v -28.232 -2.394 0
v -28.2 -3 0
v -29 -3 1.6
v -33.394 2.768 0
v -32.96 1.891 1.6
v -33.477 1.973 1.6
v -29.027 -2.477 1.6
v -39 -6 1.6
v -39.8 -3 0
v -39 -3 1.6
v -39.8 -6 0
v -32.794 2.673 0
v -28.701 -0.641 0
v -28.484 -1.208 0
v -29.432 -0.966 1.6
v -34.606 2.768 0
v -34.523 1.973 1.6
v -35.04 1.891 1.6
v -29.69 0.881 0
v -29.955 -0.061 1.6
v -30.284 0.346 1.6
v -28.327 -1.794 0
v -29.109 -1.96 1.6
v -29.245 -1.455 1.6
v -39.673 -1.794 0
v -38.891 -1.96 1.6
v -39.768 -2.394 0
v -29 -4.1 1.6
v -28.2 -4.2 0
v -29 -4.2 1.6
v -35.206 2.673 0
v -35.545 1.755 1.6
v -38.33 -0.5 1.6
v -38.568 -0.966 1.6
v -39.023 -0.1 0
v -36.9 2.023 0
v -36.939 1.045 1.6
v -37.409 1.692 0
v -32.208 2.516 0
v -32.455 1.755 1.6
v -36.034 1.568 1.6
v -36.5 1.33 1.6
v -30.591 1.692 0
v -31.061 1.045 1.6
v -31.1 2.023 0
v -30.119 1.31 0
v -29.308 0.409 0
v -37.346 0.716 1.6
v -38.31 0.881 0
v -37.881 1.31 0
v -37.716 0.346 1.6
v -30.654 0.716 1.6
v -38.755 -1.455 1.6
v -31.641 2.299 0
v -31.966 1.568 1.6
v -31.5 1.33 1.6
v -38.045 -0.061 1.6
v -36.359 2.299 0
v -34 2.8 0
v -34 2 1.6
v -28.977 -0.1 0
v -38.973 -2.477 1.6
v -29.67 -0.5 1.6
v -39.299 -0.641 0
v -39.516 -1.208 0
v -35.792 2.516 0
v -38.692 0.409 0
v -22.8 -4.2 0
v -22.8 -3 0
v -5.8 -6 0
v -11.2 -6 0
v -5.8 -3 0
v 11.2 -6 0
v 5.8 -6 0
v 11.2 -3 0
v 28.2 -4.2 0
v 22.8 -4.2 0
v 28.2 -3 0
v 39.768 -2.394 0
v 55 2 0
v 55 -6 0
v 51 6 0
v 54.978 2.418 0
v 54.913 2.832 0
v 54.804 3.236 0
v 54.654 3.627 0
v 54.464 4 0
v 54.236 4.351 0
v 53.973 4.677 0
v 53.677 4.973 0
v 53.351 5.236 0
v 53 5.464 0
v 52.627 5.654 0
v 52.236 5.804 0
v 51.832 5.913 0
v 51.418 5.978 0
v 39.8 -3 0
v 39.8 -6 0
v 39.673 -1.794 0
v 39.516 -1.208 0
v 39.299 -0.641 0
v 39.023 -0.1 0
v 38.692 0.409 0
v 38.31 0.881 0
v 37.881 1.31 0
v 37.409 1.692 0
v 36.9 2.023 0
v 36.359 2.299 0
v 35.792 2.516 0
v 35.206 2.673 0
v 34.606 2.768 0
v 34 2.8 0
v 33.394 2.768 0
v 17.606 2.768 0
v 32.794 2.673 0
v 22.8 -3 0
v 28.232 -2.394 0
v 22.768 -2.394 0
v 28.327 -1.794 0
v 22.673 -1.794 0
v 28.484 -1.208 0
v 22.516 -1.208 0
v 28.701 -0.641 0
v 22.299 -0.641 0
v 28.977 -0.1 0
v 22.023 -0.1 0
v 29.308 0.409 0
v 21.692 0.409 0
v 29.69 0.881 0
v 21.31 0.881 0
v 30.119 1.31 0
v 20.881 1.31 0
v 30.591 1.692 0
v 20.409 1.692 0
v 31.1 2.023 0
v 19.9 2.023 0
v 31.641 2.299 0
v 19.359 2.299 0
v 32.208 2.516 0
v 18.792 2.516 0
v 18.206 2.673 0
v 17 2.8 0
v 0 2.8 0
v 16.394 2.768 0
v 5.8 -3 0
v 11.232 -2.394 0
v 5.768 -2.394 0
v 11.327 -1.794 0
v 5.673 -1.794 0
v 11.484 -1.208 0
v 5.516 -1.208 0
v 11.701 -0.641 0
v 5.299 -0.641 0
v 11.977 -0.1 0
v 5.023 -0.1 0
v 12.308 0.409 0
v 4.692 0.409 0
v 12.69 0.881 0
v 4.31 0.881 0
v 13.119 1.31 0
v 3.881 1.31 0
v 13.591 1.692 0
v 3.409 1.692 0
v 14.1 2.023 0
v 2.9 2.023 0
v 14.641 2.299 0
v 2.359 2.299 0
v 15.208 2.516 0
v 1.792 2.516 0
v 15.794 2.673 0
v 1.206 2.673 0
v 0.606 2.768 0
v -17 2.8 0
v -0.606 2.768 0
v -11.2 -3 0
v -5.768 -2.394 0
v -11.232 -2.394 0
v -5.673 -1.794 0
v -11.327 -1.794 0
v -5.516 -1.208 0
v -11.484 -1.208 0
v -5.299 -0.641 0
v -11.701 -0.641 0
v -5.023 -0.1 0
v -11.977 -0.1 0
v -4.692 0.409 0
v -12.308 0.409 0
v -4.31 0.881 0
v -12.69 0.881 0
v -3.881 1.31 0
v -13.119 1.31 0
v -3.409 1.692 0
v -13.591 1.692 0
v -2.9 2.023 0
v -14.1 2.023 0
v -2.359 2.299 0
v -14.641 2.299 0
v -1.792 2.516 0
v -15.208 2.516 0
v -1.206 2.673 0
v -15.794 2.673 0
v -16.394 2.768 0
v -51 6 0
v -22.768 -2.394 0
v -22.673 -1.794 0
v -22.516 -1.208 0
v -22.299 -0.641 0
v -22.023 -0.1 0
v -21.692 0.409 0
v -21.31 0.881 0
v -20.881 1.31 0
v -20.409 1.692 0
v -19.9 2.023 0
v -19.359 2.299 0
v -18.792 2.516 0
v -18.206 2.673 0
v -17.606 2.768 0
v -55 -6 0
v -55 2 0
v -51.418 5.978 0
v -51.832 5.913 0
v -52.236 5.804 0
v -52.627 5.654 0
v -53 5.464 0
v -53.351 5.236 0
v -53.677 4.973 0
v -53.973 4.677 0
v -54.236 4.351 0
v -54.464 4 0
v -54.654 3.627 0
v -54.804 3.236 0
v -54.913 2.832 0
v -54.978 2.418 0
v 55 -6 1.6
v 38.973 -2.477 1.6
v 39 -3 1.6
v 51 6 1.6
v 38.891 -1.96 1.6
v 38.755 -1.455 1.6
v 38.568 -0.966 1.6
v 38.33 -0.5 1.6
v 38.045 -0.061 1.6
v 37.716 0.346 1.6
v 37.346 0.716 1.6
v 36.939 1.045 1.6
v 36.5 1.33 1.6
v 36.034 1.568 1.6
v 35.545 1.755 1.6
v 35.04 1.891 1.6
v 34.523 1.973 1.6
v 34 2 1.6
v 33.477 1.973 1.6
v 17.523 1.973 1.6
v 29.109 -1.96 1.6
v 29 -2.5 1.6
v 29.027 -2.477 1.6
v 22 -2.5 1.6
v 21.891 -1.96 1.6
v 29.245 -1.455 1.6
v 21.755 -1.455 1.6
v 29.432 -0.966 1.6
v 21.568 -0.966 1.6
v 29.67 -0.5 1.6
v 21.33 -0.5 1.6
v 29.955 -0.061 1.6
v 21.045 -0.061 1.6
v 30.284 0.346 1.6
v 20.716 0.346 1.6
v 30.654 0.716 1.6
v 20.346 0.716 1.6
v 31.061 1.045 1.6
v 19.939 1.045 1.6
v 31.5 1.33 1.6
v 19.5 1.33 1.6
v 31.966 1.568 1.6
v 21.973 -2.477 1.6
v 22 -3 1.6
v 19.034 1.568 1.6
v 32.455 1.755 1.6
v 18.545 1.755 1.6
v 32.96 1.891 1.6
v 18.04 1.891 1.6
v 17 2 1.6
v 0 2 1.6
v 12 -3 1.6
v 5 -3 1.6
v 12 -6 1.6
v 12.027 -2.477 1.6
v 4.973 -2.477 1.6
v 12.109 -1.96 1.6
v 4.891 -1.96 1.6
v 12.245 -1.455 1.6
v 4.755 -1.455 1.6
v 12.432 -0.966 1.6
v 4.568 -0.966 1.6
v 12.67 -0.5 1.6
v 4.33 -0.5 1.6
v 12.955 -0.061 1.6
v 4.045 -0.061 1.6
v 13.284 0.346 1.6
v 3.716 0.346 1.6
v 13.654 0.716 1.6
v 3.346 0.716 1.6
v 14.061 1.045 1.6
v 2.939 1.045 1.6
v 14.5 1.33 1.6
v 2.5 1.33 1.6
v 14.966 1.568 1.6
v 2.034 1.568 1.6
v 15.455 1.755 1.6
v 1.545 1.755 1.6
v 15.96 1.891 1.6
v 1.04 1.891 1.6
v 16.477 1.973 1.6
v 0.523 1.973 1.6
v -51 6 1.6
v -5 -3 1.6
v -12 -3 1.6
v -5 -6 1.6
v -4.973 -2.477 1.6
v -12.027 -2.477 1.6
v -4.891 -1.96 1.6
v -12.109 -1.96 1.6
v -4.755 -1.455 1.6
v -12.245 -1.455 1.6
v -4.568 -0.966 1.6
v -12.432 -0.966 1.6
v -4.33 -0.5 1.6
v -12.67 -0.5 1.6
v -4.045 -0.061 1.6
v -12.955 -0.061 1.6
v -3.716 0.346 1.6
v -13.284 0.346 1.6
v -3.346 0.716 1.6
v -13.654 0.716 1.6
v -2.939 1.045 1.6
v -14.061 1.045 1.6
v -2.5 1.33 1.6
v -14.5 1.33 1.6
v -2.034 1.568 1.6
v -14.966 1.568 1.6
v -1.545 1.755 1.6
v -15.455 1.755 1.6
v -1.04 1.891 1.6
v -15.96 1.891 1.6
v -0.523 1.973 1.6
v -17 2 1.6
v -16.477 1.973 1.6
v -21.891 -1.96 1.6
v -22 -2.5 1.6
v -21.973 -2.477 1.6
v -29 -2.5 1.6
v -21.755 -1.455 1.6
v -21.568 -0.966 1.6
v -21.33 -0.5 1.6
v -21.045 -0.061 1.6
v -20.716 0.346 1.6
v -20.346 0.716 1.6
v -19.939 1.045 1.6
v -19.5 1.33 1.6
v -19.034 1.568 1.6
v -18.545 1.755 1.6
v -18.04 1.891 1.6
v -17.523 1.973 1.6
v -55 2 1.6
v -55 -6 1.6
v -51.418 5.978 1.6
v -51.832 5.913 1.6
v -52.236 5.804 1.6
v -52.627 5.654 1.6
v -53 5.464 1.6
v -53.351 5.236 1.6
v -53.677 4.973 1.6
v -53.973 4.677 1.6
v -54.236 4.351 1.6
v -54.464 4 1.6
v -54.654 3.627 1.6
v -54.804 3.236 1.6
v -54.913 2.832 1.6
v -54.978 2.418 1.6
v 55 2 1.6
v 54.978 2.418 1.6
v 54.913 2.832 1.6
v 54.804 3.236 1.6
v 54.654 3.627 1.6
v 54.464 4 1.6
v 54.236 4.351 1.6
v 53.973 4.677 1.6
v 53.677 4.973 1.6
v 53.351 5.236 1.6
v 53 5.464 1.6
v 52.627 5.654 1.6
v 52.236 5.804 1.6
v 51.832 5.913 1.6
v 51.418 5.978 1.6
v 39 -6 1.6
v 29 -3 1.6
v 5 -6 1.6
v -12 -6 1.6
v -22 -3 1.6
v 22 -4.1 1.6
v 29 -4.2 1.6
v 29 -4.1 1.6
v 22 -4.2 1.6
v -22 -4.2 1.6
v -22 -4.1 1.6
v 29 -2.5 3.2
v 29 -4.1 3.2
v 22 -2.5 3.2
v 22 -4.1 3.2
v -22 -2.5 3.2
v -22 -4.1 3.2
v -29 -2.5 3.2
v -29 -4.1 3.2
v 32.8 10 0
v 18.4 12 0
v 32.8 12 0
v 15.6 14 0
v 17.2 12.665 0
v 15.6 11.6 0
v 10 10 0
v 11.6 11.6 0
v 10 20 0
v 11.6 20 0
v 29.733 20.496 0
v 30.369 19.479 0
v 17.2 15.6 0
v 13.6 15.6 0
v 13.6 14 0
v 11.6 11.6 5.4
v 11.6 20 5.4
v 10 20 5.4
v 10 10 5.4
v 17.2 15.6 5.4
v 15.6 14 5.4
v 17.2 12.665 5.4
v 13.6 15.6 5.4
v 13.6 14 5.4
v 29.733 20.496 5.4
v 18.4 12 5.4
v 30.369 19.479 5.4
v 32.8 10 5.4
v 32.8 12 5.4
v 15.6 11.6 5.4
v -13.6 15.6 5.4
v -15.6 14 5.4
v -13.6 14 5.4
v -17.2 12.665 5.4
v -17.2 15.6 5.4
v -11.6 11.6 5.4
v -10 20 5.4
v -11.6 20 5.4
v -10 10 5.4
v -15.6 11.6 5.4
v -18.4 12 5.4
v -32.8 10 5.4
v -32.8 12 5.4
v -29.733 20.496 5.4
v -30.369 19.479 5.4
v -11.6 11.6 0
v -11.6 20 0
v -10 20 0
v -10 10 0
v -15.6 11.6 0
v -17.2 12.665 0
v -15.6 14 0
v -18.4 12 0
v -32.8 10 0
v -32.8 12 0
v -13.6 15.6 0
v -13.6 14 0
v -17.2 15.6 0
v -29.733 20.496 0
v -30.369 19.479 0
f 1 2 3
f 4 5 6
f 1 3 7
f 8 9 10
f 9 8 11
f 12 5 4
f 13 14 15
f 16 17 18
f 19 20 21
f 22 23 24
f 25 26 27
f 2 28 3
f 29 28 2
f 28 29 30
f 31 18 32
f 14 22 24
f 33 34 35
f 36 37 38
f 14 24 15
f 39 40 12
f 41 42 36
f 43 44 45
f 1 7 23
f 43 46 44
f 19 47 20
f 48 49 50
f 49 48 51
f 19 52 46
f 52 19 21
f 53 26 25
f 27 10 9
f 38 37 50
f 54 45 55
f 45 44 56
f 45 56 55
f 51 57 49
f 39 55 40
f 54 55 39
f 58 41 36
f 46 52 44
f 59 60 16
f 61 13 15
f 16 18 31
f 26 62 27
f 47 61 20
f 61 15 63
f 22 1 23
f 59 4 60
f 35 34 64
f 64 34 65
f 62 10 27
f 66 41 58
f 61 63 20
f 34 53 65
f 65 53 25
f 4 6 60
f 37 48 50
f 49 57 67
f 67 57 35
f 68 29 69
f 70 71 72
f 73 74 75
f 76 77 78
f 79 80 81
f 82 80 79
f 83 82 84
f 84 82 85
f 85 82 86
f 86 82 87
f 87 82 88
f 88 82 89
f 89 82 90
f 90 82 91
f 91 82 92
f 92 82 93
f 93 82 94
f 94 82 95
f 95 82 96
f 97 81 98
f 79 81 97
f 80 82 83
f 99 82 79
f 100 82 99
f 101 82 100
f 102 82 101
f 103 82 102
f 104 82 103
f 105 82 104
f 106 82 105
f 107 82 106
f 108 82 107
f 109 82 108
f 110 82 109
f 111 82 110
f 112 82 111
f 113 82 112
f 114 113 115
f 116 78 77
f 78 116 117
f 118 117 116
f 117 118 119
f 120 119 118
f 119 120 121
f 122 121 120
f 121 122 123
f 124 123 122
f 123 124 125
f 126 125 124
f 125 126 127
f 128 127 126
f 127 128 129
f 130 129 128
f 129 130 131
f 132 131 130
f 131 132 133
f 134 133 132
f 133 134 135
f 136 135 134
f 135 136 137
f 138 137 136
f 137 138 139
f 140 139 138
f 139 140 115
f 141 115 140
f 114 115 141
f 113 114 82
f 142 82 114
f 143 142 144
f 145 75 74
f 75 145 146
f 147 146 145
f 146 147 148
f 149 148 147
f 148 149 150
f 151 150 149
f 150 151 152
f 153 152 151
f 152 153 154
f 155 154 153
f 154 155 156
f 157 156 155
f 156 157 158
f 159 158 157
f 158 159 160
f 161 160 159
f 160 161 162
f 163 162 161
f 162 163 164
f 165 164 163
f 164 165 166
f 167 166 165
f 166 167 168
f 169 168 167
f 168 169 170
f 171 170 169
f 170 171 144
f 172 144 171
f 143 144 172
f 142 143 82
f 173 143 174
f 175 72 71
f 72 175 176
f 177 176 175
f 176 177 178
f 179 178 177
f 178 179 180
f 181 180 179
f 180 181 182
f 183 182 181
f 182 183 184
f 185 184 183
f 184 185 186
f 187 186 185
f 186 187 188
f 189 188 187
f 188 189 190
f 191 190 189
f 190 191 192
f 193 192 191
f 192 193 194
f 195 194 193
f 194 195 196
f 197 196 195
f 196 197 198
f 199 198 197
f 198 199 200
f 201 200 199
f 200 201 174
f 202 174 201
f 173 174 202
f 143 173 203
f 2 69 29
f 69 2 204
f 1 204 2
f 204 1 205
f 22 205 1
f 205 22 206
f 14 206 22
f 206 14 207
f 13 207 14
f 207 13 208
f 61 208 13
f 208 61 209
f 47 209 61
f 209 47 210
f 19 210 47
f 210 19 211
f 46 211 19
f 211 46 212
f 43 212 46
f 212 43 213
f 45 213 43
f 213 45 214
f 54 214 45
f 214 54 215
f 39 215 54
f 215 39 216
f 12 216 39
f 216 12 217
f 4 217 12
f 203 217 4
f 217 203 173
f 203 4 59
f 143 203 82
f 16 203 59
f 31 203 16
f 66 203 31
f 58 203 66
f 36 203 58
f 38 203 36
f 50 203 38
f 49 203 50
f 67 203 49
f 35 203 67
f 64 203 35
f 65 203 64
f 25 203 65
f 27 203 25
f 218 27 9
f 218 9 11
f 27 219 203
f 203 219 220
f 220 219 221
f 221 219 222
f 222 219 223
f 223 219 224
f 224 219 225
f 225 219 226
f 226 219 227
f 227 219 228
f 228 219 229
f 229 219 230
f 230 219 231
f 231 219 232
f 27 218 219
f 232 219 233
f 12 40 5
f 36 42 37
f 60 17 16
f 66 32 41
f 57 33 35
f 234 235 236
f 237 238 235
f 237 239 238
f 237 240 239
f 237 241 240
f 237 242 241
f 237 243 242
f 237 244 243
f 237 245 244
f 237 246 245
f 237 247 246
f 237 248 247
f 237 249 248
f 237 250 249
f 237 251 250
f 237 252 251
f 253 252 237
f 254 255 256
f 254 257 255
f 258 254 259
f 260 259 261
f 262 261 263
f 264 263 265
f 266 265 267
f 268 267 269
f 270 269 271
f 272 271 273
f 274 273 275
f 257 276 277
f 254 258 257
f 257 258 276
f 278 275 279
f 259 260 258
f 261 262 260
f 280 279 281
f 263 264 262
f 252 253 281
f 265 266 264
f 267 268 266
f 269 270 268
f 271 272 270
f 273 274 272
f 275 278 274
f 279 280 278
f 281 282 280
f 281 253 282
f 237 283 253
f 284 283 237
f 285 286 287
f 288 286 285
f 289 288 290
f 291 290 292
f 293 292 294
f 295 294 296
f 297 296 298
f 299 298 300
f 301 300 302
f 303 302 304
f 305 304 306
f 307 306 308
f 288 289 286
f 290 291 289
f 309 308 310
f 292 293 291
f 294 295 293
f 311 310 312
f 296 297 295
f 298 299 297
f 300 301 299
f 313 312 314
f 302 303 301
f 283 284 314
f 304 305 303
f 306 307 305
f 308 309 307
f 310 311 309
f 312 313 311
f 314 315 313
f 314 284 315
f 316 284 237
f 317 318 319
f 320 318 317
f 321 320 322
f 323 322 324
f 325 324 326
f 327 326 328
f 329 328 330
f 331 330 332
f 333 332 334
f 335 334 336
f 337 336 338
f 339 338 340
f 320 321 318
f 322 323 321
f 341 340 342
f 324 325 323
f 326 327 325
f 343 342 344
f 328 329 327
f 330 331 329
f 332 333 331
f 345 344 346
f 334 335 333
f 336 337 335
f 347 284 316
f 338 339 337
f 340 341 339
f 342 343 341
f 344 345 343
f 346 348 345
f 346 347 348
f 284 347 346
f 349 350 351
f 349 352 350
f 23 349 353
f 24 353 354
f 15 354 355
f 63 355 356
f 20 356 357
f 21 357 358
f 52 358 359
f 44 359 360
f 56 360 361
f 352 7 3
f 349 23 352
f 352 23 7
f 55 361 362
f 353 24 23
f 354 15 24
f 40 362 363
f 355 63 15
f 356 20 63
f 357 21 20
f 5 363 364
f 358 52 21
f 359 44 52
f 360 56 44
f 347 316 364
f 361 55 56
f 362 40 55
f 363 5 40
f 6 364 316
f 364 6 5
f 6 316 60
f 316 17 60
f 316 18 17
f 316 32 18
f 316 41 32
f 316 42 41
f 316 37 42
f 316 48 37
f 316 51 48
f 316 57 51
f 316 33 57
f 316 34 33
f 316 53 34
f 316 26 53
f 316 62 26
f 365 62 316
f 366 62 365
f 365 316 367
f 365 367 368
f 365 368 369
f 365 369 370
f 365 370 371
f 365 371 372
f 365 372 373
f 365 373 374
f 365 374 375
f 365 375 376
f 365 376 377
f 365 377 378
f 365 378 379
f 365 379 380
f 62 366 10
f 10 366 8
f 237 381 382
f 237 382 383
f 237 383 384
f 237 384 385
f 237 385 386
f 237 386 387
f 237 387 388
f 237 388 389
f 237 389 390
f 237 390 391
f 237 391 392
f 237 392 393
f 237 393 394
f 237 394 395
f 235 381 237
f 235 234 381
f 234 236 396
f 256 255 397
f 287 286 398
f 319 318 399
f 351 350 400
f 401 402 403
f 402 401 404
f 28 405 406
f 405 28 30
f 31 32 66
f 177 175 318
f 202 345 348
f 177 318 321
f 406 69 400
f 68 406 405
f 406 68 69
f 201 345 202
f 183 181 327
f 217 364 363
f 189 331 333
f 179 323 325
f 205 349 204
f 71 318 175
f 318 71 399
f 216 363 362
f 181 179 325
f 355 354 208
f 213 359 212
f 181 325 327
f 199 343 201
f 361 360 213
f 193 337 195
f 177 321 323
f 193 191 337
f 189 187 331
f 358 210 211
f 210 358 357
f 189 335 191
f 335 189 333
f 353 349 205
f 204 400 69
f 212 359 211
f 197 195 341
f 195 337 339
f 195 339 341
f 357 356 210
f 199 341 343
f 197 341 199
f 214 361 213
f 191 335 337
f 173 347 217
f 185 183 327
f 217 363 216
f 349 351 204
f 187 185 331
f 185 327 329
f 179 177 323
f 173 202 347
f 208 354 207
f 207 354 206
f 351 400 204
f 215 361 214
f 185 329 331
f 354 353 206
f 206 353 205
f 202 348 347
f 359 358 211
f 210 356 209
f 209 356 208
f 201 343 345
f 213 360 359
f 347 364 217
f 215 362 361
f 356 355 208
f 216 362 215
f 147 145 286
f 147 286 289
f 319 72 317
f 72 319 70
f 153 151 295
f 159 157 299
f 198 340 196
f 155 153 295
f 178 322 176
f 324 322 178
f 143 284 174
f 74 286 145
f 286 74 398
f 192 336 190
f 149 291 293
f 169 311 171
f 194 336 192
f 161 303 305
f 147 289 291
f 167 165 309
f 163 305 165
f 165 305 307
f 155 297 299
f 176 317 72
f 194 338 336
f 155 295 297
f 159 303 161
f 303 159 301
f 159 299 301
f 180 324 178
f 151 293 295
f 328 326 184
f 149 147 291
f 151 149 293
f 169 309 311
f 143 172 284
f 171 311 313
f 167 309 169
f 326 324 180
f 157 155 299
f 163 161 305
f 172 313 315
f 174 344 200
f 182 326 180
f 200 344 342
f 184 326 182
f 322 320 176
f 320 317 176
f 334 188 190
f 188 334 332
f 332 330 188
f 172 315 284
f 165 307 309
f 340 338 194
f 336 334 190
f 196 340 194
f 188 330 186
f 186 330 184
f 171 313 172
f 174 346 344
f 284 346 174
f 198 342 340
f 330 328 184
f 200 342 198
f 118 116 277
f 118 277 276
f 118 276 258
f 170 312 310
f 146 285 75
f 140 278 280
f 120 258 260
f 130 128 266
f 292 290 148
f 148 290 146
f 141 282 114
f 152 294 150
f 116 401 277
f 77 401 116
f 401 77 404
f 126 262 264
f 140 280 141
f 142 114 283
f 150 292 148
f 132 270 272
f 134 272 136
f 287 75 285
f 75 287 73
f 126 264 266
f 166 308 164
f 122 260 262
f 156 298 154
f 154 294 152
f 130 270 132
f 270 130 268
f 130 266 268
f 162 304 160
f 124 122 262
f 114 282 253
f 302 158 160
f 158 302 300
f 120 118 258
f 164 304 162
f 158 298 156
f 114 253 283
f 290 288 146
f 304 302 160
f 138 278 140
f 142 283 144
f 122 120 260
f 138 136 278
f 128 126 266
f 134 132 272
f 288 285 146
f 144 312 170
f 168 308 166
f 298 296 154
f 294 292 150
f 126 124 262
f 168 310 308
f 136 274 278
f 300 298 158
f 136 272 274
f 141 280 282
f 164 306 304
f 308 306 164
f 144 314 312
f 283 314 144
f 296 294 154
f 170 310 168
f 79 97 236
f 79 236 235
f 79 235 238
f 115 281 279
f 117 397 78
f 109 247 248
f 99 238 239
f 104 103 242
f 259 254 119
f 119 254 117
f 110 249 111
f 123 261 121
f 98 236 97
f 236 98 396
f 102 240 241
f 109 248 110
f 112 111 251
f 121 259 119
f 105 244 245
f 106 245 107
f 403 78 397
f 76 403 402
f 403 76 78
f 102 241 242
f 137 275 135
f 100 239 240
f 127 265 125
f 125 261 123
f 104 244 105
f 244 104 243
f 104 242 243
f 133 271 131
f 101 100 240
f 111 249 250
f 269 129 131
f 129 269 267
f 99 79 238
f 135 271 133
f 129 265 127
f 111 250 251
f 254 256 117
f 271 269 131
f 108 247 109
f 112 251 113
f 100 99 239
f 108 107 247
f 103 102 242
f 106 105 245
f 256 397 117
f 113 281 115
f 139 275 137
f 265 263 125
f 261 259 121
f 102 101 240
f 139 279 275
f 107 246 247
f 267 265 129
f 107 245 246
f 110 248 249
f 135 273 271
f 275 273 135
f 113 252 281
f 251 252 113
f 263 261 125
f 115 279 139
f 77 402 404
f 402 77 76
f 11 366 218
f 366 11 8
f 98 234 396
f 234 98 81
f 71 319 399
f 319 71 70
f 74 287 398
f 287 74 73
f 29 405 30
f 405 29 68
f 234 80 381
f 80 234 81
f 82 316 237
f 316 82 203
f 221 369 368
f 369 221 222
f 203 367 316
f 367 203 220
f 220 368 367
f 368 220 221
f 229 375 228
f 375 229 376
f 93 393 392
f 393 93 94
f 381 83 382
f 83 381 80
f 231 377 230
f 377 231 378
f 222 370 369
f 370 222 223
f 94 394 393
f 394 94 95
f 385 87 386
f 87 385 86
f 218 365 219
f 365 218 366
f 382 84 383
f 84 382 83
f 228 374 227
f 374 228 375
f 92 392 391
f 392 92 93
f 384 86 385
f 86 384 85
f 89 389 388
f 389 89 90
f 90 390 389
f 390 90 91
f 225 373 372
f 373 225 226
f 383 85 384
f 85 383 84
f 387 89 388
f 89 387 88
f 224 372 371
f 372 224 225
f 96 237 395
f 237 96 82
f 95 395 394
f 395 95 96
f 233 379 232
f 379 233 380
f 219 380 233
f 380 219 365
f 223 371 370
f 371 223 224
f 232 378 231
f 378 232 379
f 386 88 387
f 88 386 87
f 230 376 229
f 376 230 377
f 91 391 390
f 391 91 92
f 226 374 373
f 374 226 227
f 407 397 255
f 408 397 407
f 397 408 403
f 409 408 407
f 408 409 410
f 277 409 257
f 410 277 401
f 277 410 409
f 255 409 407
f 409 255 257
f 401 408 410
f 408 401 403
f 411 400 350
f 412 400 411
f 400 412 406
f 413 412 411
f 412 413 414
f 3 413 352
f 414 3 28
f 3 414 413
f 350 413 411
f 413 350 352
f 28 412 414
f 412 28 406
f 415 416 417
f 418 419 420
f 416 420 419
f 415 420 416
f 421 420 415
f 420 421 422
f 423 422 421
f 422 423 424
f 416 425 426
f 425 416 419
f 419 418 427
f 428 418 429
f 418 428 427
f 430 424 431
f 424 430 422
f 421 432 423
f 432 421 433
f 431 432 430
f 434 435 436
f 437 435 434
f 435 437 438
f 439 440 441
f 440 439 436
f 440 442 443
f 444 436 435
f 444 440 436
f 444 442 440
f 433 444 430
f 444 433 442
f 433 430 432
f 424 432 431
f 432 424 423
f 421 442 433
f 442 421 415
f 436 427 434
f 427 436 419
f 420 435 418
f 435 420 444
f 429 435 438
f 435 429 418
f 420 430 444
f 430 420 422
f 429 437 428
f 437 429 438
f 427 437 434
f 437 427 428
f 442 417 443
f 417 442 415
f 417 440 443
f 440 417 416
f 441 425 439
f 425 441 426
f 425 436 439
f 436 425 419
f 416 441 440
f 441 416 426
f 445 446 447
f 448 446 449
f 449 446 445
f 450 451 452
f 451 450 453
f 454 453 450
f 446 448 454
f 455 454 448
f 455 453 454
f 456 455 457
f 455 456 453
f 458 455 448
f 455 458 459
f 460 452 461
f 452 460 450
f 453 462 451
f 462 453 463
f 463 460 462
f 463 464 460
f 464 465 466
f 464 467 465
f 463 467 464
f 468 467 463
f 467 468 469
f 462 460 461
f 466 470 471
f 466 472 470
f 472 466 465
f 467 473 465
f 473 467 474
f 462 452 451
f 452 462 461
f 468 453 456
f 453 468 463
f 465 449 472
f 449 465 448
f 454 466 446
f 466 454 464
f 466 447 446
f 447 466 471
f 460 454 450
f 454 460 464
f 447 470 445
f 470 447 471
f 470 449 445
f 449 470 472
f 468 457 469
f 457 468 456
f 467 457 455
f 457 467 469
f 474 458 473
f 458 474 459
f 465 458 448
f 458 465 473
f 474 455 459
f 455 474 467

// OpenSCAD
// Which one would you like to see?
part = "both"; // [first:Guard only,second:Clamps Only,both:Both,preview:Preview only (do not print!)]

/* [Global] */

// Thickness (mm)
guard_thickness = 1.6;
// Total length of mouse guard (mm)
length = 110;
// Maximum space between clamps (mm)
clamp_distance = 70;
// Adjust for printer accuracy and material and assure a tight fit of clamps
tightness=.4;
// Clamp angle adjust for entrance depth/height
clamp_angle=32;

/* [Hidden] */

// Entrance taper
taper = 1; // [first:1,second:0]

// Size of entrance holes (mm)
hole_size = 10;

leng = length;
heit = 12;
thick = guard_thickness;
heit3 = 30;
slit2 = clamp_distance/2;
angle = clamp_angle;
tight = tightness;
tapering = (taper==1?guard_thickness/2:0);

holdheit = 4;

rad = hole_size;
between = 7;

numholes = floor(leng/(rad+between))-1;
//echo(numholes);
spacing = (rad+between); //leng / numholes;

holesize = spacing*(numholes-1)+rad;
//echo(holesize);

//#cube([holesize,2,2],center=true);


$fn = 60;

offset = leng/2-(leng-holesize)/2-rad/2;

module mycube(lng,het,thc)
{
    rr = 4;
    $fn = 60;
    hull()
    {
        translate([-lng/2+2,-het/2+2,0])
            cube([4,4,thc],center=true);
        translate([lng/2-2,-het/2+2,0])
            cube([4,4,thc],center=true);
        translate([-lng/2+rr,het/2-rr,0])
            cylinder(r=rr,h=thc,center=true);
        translate([lng/2-rr,het/2-rr,0])
            cylinder(r=rr,h=thc,center=true);
    }
}

module front()
{
    difference()
    {
        mycube(leng,heit,thick);

        for(i=[0:numholes-1])
        {
            translate([i*spacing-offset,-heit/2+rad/2-2,0])
                hull()
                {
                    cylinder(r2=rad/2,r1=rad/2+tapering,h=thick,center=true);
                    translate([0,-10,0])
                        cylinder(r2=rad/2,r1=rad/2+tapering,h=thick,center=true);
                }
        }
    //#cube([70,2,2],center=true);
    
        if(floor(numholes/2) == numholes/2)
        {
            //echo("Even");
            position = between/2+floor(slit2/spacing)*spacing-between/2;
            translate([position,-heit/2,-thick])
                holder();
            translate([-position,-heit/2,-thick])
                holder();
        }
        else
        {
            //echo("Odd");
            position = -between/2+floor(slit2/spacing)*spacing-rad/2;
            translate([position,-heit/2,-thick])
                holder();
            translate([-position,-heit/2,-thick])
                holder();
        }
    }
    betwen = 1.6;
    thic = 1.8;
    if(floor(numholes/2) == numholes/2)
    {
        //echo("Even");
        position = between/2+floor(slit2/spacing)*spacing-between/2;
        translate([position,-heit/2+thic/2+thic,betwen/2+thick/2])
            cube([between,1.6,betwen],center=true);
        translate([-position,-heit/2+thic/2+thic,betwen/2+thick/2])
            cube([between,1.6,betwen],center=true);
    }
    else
    {
        //echo("Odd");
        position = -between/2+floor(slit2/spacing)*spacing-rad/2;
        translate([position,-heit/2+thic/2+thic,betwen/2+thick/2])
            cube([between,1.6,betwen],center=true);
        translate([-position,-heit/2+thic/2+thic,betwen/2+thick/2])
            cube([between,1.6,betwen],center=true);
    }
}

module holder(thic = 1.8)
{
    
    translate([0,thic/2,0])
        cube([between,thic,thick*10],center=true);
}

module wedge1()
{
    hull()
    {
        translate([0,.5,0])
        rotate(5,[1,0,0])
            cube([between,.2,3],center=true);
        translate([0,-.8,0])
        rotate(-5,[1,0,0])
            cube([between,.2,3],center=true);
    }
}

module wedge2()
{
    hull()
    {
        translate([0,.3,0])
        rotate(5,[1,0,0])
            cube([between,.2,3],center=true);
        translate([0,-.6,0])
        rotate(-5,[1,0,0])
            cube([between,.2,3],center=true);
    }
}




module clamp(thic = 1.6)
{
    //#cube([6,6,20-7]);
    between = between - 2*tapering;
    cube([between,heit-2,thic]);
    translate([0,0,thick+thic+2+tight])
        cube([between,4,thic]);

    cube([between,thic,2+thic+thick+tight+thic]);

    translate([0,thic*2+thic/2,thic+thick+tight])
        cube([between,thic,2+thic]);


    translate([0,0,thic+thick+tight+thic+thic])
        cube([between,thic+tight,16]);

    translate([0,1,thic+thick+tight+thic+thic])
    rotate(-angle,[1,0,0])
        cube([between,1.2,16]);
}

if(part=="first" || part == "both")
{
translate([0,0,thick/2])
    front();
}

if(part=="second" || part == "both")
{
translate([10,10,between-2*tapering])
rotate(90,[0,1,0])
    clamp();


translate([-10,10,0])
rotate(-90,[0,1,0])
    clamp();
}

if(part=="preview")
{
rotate(180,[0,0,1])
    union()
    {
    rotate(90,[1,0,0])
    translate([0,heit/2,thick/2])
        front();
    
    
    if(floor(numholes/2) == numholes/2)
    {
        position = between/2+floor(slit2/spacing)*spacing-between/2;
        translate([position-(between-tapering)/2,thick+.2,0])
            rotate(90,[1,0,0])
                clamp();
        translate([-position-(between-tapering)/2,thick+.2,0])
            rotate(90,[1,0,0])
                #clamp();
    }
    else
    {
        //echo("Odd");
        position = -between/2+floor(slit2/spacing)*spacing-rad/2;
        translate([position-(between-tapering)/2,thick+.2,0])
            rotate(90,[1,0,0])
                clamp();
        translate([-position-(between-tapering)/2,thick+.2,0])
            rotate(90,[1,0,0])
                clamp();
    }
}
}
